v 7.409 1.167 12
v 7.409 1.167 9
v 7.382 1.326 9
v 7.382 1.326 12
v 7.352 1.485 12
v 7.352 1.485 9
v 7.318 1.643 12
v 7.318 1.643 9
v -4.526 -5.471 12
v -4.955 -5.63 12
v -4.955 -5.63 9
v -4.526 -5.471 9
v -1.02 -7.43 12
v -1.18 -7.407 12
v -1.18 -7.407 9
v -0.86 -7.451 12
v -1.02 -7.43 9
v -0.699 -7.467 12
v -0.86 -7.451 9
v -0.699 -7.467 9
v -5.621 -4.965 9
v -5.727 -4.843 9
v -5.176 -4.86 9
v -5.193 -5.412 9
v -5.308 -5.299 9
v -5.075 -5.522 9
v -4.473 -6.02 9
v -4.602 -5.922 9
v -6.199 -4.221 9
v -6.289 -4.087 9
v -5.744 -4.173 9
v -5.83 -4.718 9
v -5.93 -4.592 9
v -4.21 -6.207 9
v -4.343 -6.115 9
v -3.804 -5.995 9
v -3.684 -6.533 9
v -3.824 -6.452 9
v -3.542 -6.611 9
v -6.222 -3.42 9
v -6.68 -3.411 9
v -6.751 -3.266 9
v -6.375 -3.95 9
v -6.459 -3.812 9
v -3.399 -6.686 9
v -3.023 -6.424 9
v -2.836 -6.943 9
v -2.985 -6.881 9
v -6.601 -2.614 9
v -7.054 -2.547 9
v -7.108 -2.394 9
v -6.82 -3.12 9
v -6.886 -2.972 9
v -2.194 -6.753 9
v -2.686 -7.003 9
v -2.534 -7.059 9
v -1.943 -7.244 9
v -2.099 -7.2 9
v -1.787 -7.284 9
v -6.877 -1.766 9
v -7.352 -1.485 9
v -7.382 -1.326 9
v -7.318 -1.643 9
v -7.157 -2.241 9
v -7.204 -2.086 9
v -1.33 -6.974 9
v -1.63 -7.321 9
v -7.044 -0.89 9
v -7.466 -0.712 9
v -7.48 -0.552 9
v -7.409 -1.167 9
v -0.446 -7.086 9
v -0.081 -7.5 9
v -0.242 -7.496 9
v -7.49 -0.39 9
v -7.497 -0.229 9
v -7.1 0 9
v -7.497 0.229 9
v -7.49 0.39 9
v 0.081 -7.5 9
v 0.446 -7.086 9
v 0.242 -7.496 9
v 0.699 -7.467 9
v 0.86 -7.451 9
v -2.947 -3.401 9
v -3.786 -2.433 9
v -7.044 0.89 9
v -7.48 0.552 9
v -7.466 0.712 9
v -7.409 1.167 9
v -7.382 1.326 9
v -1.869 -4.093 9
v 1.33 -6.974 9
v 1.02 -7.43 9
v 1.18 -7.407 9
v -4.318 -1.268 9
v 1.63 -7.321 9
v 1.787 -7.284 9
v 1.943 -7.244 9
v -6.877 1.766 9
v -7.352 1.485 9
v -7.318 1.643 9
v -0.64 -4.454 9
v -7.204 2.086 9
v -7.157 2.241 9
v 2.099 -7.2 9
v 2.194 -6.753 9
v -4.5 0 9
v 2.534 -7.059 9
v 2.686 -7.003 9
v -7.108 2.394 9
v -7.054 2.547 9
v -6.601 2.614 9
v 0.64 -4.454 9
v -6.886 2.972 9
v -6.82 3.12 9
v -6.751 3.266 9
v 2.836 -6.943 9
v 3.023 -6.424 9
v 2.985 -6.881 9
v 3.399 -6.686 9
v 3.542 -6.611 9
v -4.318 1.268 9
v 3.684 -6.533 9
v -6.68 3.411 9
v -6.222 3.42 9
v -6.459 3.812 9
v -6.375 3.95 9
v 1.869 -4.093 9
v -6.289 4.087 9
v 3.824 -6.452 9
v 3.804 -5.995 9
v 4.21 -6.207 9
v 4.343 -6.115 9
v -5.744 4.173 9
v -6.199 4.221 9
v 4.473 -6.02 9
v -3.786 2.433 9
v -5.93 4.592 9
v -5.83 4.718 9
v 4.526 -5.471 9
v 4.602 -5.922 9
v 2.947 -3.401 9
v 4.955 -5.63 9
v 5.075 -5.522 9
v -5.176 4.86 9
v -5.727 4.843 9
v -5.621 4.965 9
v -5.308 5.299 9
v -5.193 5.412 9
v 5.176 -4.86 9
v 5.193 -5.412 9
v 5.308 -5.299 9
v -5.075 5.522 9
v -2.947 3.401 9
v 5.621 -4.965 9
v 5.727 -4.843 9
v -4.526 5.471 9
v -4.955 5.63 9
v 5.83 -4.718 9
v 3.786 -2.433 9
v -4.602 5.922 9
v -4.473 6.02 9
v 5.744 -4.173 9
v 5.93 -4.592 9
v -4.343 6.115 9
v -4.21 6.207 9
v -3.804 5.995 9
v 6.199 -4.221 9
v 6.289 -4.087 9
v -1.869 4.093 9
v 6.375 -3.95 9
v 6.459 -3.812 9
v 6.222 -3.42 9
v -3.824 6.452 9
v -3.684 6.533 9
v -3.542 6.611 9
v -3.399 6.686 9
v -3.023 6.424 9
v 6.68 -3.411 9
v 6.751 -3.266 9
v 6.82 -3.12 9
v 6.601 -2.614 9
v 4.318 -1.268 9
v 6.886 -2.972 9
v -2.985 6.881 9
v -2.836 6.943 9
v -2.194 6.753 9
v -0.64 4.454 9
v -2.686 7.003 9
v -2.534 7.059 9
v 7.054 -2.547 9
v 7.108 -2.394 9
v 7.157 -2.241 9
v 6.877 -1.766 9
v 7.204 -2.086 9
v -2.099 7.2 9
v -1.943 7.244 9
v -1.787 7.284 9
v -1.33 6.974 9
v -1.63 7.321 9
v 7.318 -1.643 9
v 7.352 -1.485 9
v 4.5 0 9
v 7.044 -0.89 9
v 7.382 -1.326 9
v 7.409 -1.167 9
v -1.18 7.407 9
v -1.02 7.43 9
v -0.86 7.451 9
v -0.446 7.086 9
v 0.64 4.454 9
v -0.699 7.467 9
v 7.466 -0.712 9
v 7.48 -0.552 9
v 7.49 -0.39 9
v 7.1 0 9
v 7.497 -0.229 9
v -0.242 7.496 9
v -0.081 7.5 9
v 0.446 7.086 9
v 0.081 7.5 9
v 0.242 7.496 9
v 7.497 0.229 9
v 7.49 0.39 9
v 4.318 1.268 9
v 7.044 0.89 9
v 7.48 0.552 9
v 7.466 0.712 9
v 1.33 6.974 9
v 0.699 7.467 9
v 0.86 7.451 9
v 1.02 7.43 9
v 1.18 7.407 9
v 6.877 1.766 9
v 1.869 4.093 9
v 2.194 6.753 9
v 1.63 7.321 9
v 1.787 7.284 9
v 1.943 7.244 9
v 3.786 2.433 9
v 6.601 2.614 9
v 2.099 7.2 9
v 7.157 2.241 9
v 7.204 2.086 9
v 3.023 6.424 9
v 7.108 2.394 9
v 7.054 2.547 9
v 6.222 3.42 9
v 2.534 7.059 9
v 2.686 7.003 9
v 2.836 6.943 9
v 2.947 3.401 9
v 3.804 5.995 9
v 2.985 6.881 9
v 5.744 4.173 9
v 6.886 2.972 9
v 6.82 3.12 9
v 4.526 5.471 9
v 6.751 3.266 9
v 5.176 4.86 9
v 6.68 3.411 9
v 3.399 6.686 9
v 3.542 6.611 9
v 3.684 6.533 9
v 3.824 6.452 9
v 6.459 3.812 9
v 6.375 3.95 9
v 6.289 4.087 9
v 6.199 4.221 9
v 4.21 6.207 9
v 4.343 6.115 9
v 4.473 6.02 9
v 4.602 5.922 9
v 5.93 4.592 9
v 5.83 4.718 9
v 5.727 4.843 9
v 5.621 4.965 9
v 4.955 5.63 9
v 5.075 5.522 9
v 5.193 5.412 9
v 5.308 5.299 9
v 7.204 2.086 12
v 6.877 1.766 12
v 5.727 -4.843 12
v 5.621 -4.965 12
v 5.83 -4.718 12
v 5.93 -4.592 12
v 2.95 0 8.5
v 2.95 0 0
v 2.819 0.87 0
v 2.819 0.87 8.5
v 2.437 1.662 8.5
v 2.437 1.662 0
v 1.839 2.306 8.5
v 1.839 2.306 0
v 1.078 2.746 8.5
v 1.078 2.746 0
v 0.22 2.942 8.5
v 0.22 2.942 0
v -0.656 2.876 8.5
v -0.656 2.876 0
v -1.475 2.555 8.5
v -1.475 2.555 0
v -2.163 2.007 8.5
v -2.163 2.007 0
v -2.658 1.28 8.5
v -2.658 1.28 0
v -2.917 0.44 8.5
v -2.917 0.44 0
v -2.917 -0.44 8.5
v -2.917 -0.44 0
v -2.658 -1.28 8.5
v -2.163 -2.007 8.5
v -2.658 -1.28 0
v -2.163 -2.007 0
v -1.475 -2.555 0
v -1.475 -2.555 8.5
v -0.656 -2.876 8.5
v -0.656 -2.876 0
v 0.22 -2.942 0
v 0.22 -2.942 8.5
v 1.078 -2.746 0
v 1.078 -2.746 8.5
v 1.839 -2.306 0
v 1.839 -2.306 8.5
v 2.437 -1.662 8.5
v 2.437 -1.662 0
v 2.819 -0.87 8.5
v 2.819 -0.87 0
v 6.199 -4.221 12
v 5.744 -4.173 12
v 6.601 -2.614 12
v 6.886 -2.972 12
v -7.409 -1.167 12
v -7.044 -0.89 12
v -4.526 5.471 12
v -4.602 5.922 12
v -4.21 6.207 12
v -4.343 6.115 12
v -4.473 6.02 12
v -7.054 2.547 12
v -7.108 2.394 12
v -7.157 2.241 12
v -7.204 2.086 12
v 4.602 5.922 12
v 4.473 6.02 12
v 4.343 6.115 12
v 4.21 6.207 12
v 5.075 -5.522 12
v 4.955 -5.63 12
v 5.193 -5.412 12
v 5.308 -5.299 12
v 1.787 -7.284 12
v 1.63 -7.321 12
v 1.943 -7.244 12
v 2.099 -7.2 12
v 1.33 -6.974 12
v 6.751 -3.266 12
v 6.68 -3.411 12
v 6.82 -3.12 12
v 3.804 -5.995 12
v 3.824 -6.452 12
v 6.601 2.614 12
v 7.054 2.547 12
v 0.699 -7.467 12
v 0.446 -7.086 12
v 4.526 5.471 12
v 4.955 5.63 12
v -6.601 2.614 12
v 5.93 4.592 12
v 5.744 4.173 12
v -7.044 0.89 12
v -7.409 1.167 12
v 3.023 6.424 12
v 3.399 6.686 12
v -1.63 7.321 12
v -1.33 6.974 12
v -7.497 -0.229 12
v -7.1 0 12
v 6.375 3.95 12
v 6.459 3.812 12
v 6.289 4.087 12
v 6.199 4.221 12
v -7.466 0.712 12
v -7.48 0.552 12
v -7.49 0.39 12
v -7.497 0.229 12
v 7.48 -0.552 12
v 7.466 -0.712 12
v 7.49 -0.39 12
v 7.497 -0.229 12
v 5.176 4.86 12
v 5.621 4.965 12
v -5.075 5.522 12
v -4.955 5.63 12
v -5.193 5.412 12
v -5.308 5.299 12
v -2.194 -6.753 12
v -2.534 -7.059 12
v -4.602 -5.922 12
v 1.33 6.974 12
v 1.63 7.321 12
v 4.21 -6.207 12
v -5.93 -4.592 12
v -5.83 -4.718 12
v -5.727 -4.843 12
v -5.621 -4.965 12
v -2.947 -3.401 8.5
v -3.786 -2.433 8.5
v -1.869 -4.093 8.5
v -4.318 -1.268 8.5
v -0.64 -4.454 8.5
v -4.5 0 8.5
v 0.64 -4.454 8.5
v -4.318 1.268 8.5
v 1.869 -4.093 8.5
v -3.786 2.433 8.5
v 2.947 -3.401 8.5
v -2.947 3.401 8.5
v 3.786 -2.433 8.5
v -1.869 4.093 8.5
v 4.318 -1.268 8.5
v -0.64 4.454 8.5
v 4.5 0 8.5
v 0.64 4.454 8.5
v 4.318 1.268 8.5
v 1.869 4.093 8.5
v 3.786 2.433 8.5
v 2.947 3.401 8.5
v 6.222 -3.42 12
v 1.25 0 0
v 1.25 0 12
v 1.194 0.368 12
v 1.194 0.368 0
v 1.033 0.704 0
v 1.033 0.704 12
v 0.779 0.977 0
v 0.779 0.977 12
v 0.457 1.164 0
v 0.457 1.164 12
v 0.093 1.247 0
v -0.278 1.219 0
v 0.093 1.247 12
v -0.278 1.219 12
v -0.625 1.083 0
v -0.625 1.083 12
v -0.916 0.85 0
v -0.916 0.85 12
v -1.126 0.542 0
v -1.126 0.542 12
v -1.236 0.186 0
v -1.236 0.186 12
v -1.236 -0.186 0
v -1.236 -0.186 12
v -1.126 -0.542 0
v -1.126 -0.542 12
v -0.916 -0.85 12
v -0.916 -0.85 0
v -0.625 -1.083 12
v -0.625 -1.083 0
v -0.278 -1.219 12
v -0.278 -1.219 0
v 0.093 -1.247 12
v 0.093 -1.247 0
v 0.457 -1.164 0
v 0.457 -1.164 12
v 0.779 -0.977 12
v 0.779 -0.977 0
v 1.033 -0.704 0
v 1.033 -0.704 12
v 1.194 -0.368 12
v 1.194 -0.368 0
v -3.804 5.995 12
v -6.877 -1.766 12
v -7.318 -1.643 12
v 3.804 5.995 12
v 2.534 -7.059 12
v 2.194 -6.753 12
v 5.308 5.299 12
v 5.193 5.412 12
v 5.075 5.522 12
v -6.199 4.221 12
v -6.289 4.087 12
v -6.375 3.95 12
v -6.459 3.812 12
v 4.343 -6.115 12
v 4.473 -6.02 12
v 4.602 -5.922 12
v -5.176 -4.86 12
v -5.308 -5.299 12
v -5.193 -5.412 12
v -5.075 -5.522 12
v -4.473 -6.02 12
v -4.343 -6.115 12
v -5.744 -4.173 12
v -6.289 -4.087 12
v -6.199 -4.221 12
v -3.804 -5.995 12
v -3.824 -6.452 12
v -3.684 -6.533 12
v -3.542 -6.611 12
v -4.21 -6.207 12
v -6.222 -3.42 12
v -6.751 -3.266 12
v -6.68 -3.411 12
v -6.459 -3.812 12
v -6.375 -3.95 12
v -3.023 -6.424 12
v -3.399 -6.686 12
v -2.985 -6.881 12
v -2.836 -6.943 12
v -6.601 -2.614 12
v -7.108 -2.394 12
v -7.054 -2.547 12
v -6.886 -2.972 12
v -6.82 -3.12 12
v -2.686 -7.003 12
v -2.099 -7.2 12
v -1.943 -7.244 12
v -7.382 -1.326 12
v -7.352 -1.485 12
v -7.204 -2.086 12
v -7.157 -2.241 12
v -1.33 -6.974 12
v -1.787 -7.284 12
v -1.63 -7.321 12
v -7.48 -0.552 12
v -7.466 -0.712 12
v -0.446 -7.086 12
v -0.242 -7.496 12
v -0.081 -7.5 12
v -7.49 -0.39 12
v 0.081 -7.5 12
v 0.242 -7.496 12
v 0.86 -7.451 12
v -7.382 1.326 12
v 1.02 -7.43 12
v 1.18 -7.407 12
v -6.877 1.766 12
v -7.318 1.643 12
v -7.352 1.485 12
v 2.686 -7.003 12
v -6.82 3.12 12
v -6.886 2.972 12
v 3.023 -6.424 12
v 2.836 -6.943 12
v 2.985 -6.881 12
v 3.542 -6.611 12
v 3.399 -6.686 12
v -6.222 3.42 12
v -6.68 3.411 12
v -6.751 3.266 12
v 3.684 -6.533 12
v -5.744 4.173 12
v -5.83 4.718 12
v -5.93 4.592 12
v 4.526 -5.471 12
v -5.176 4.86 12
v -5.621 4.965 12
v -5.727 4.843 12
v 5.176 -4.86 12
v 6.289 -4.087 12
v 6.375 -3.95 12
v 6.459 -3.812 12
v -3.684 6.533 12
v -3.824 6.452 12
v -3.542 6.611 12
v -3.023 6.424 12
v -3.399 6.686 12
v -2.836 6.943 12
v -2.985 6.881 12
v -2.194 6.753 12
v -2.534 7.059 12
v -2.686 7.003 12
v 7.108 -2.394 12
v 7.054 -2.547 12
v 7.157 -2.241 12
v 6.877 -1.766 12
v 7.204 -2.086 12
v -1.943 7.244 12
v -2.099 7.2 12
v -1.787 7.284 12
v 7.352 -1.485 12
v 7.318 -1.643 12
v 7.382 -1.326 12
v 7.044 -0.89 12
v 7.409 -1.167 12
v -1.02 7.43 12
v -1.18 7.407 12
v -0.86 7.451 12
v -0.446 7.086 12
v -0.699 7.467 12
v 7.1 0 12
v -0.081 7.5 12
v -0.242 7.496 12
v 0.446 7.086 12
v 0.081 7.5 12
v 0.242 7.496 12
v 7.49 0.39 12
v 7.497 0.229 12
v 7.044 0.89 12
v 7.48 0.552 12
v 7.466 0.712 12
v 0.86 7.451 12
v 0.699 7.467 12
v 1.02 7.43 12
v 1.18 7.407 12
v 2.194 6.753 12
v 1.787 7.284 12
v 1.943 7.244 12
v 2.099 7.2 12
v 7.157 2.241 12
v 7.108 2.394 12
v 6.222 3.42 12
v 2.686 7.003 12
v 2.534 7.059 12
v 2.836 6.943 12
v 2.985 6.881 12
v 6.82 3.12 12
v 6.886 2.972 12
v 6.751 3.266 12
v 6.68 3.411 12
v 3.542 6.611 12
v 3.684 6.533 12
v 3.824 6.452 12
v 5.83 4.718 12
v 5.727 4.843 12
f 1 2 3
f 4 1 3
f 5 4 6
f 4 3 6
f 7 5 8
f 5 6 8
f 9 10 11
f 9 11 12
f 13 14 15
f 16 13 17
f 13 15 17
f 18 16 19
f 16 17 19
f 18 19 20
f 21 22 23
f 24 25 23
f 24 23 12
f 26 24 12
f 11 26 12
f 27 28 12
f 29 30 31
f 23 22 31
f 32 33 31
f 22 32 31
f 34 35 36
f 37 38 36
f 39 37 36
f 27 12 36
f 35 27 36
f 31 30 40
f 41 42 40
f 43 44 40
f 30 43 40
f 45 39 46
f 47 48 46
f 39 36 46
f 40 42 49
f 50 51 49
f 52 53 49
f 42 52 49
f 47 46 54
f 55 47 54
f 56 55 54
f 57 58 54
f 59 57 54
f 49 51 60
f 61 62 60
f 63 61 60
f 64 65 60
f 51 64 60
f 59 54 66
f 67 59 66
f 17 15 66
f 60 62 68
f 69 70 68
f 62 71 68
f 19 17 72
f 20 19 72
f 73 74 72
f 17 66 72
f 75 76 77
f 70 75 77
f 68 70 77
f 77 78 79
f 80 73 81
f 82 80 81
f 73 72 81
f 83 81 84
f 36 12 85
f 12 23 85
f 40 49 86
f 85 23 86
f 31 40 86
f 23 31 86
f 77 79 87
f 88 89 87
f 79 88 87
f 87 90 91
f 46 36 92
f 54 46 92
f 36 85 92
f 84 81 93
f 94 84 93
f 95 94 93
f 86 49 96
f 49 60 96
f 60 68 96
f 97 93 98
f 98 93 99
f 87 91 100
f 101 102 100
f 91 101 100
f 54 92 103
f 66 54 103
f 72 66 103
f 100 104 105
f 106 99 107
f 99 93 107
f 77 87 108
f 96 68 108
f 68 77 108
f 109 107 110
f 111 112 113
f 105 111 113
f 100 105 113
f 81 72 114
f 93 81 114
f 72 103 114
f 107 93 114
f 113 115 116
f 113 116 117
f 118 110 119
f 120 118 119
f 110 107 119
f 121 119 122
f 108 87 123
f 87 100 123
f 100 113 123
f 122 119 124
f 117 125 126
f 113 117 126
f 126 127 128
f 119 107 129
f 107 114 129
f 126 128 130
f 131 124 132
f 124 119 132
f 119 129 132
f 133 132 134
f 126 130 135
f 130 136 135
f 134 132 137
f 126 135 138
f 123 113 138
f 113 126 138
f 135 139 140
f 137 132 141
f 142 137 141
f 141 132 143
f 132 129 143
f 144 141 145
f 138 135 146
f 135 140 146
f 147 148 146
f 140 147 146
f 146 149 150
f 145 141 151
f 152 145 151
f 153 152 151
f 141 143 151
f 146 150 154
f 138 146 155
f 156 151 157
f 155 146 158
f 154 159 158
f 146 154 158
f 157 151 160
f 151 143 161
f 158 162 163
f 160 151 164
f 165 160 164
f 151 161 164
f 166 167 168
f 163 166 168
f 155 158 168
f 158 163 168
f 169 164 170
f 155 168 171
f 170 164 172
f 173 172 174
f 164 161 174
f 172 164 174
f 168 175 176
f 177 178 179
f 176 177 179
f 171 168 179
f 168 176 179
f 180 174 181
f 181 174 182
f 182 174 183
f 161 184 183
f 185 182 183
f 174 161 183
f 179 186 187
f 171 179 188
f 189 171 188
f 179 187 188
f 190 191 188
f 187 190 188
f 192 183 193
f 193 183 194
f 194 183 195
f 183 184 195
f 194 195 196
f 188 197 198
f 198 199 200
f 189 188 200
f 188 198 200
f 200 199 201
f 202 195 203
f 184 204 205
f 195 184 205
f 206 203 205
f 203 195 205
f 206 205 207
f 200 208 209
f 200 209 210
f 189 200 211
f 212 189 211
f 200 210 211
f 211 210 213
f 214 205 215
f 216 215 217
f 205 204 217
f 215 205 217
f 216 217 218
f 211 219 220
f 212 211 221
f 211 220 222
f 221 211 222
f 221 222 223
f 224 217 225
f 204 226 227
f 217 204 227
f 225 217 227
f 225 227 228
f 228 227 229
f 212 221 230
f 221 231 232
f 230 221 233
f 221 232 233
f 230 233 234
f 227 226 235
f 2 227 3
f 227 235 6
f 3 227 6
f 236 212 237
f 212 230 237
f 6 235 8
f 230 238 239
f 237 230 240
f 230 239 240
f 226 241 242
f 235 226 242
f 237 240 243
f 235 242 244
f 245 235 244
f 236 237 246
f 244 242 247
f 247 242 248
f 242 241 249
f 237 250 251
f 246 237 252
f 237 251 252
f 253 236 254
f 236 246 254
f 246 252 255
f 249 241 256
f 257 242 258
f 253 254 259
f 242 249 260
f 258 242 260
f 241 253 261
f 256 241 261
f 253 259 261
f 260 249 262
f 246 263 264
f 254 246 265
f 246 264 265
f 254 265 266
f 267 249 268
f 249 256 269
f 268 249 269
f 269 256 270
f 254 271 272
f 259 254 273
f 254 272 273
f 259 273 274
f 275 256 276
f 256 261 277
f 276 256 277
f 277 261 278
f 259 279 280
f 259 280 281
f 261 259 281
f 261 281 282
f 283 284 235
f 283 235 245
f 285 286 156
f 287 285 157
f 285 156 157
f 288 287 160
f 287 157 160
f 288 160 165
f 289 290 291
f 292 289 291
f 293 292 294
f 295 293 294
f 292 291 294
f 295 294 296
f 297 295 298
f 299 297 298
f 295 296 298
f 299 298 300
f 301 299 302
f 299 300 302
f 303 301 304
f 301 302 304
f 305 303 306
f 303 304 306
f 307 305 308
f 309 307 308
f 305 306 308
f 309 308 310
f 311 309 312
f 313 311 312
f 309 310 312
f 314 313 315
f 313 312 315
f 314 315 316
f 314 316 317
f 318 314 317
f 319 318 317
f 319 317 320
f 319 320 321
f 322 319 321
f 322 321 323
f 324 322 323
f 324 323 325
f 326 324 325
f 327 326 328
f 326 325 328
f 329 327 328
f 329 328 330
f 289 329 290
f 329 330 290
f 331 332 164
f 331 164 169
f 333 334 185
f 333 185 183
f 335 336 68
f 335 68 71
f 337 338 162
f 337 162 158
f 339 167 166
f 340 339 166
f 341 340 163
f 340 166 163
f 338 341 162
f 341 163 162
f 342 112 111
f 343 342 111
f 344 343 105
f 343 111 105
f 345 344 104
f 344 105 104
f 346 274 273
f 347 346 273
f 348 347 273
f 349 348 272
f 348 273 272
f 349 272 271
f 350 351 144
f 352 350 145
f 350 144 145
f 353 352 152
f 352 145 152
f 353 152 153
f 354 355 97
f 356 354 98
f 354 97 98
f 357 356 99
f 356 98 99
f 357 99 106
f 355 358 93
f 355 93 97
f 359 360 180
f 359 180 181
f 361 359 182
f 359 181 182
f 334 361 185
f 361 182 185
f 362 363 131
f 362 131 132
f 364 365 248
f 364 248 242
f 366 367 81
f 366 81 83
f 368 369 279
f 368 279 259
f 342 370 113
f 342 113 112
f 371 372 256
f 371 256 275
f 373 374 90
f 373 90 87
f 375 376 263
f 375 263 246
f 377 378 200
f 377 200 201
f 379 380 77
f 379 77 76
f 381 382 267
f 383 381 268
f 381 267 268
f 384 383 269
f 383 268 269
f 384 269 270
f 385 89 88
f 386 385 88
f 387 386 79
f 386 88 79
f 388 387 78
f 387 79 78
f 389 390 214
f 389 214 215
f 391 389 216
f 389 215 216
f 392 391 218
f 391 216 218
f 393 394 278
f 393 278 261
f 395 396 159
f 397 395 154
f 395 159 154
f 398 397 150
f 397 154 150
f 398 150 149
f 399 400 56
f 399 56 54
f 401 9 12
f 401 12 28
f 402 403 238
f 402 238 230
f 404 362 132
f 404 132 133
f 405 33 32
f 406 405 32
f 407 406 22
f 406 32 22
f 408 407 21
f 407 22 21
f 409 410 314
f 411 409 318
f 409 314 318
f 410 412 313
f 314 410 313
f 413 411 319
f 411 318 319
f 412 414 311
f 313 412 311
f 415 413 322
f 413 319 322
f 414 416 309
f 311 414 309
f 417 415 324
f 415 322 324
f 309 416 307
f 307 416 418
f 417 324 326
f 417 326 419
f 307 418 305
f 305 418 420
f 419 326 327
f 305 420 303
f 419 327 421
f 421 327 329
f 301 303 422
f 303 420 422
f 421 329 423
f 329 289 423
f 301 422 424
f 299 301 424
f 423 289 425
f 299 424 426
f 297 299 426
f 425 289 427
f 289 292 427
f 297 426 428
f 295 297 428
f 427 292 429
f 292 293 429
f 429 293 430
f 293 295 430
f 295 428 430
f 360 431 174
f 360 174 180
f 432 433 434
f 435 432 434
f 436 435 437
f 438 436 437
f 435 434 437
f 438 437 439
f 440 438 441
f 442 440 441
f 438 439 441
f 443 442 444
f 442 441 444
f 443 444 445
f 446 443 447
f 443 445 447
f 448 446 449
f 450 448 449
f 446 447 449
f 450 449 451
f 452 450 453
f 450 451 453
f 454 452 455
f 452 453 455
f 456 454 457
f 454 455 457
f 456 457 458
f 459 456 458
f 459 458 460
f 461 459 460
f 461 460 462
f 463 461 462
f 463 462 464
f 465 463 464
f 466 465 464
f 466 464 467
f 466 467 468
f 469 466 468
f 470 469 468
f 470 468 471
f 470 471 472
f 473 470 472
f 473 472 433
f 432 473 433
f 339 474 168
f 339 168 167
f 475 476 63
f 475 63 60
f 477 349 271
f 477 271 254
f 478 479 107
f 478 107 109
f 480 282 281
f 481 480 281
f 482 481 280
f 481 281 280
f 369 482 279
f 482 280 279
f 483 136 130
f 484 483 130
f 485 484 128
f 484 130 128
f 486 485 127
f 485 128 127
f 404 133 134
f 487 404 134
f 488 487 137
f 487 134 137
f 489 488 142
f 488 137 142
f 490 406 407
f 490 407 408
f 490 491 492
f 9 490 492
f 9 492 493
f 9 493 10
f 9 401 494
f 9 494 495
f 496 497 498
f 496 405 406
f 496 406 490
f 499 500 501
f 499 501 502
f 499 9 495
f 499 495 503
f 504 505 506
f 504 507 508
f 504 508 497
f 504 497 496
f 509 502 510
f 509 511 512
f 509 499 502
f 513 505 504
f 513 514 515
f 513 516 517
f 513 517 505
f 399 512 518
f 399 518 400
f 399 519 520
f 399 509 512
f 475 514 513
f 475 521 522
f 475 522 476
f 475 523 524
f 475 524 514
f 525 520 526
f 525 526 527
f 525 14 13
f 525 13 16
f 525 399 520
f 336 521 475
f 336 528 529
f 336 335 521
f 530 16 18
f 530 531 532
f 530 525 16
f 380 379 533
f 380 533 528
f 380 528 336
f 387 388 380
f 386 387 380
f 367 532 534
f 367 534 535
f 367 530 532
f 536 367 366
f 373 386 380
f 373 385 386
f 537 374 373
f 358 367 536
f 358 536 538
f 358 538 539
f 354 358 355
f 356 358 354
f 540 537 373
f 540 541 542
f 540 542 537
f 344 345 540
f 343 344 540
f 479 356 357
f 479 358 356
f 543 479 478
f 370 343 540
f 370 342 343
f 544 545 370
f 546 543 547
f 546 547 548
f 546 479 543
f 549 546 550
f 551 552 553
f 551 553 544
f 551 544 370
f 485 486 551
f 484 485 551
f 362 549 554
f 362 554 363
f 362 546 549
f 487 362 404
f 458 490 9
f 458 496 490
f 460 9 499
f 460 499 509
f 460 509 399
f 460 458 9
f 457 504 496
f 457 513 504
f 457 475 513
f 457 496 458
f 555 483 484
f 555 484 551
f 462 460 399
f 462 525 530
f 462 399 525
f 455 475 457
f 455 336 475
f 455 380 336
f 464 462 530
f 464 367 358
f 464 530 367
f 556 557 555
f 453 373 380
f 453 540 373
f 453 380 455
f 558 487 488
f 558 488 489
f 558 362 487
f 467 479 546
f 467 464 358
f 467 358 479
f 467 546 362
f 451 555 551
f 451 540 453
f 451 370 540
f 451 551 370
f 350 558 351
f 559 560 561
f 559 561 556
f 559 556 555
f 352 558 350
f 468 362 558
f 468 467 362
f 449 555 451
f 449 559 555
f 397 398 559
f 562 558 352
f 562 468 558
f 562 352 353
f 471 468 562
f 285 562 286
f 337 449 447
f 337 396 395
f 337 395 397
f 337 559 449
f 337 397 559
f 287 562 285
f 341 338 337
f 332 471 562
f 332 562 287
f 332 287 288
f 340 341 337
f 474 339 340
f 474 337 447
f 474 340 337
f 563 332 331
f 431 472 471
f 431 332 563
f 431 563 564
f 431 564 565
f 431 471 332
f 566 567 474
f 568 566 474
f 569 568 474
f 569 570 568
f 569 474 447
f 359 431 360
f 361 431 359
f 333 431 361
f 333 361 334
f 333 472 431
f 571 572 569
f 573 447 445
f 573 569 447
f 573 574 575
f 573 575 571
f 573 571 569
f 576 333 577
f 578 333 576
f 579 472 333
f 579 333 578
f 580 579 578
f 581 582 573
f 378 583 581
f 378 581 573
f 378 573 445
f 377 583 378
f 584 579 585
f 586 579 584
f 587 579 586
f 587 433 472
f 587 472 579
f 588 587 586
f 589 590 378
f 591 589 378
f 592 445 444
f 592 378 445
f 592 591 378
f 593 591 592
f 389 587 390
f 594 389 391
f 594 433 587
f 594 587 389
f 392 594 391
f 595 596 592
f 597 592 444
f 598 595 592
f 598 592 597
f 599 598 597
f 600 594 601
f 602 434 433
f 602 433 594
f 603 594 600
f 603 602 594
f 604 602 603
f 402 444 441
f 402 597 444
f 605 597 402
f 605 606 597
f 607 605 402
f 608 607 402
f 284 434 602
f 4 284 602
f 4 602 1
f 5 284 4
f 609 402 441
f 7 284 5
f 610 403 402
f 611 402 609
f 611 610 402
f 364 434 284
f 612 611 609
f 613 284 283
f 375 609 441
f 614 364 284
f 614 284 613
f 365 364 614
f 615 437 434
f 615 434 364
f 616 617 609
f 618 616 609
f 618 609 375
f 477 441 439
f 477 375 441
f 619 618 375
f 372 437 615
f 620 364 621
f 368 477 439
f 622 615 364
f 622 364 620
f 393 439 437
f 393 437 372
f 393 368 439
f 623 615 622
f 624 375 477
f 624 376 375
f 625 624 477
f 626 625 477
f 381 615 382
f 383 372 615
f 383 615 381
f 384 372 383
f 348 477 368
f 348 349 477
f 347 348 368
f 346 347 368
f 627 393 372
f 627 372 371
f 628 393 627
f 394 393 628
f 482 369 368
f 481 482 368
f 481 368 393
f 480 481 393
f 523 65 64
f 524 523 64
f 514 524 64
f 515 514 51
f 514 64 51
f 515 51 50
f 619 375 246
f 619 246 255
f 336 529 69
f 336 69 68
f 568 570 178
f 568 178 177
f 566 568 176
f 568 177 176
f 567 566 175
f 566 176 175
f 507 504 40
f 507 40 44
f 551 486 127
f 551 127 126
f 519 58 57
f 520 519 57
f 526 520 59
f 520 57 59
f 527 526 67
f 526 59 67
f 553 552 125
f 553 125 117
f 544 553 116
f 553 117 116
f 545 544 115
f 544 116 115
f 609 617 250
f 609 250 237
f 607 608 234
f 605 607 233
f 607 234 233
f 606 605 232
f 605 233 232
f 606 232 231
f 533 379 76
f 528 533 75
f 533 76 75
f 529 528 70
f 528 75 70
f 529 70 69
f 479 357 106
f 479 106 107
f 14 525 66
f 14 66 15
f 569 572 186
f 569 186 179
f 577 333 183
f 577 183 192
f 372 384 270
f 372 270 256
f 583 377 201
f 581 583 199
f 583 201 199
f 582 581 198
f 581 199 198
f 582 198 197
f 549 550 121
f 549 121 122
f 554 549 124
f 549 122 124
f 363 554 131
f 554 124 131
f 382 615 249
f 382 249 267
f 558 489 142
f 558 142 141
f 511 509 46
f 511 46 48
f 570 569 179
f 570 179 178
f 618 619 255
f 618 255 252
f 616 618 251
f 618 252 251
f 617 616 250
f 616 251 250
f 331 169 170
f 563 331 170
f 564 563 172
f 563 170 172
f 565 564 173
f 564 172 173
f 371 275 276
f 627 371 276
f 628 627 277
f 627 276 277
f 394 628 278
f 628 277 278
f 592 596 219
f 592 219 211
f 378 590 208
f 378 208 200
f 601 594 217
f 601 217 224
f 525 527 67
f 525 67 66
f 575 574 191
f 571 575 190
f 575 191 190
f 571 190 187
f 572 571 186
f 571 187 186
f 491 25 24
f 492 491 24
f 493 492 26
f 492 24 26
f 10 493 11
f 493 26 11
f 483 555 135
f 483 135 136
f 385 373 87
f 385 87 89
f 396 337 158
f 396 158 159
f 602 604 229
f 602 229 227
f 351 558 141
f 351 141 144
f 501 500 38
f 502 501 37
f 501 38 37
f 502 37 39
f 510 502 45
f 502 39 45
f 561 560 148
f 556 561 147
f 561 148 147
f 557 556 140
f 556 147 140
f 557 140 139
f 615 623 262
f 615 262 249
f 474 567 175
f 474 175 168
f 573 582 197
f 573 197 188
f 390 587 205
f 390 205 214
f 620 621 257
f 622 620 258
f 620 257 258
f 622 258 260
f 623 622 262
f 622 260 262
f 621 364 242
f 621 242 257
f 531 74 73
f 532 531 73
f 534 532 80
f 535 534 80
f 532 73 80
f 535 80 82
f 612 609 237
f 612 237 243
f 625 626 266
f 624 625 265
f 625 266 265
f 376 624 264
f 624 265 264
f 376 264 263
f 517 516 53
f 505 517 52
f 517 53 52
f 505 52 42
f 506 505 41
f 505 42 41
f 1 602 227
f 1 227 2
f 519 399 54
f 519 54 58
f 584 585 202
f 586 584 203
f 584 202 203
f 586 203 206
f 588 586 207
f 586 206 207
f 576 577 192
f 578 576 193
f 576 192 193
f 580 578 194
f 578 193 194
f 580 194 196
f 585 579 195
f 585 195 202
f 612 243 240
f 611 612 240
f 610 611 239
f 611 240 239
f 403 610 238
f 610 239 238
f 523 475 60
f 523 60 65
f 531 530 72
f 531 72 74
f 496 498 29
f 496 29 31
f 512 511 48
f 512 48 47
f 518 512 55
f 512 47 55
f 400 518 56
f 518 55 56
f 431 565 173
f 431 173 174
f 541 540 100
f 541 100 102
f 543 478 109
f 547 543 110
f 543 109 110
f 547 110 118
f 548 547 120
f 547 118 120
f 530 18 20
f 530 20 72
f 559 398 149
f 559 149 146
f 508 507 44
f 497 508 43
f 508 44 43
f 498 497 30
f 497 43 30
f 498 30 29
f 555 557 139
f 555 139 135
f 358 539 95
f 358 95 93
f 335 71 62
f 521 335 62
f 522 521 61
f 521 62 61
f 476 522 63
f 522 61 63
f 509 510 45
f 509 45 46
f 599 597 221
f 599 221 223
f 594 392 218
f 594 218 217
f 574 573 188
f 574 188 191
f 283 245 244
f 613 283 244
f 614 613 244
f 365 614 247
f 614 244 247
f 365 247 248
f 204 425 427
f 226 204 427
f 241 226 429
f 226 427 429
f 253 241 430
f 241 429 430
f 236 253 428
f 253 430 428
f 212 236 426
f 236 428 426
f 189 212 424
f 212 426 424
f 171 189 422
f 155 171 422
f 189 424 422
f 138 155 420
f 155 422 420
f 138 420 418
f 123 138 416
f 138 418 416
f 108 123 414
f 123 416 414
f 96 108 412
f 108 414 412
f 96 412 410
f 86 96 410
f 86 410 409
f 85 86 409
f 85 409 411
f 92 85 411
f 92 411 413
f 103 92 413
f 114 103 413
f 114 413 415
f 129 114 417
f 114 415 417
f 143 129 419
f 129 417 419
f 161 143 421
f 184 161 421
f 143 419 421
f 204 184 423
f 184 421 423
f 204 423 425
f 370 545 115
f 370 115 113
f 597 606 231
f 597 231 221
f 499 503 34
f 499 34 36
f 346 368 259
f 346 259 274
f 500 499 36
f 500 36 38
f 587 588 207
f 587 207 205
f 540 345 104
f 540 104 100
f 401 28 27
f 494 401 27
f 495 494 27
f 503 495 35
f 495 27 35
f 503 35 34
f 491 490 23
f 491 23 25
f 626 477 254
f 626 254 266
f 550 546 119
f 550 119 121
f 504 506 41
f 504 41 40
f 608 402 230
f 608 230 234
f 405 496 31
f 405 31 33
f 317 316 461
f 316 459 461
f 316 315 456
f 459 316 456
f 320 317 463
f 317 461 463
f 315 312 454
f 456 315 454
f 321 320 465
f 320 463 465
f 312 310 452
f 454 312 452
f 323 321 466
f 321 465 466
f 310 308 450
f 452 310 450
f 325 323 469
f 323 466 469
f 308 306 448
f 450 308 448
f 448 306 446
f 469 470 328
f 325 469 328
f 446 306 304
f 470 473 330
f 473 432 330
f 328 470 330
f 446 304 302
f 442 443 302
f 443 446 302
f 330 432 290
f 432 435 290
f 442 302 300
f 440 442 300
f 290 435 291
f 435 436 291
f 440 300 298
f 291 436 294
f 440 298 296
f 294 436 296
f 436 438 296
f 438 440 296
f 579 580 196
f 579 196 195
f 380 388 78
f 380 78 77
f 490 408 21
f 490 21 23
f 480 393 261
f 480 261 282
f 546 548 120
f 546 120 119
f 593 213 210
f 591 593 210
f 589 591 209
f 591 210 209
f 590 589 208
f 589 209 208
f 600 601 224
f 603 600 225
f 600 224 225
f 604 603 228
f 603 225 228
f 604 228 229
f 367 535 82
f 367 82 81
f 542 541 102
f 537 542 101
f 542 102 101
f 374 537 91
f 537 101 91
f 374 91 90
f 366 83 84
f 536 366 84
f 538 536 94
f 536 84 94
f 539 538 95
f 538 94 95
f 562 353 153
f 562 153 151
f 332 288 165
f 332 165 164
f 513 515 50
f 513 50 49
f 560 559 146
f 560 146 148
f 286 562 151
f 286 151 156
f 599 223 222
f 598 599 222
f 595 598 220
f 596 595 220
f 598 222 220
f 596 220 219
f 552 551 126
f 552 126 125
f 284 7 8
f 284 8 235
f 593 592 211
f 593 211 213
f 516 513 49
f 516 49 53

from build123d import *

# Parameters (mm, degrees)
SKETCH_R           = 2.95
PAD_DEPTH          = 8.5
SKETCH001_R        = 4.5
PAD001_DEPTH       = 0.5
SKETCH002_R        = 7.5
PAD002_DEPTH       = 3
SKETCH003_R        = 1.25
HOLE_DEPTH         = 12.001
POCKET_DEPTH       = 60.74523
POLARPATTERN_COUNT = 50


with BuildPart() as part:
    # Sketch → Pad (new body)
    with BuildSketch(Plane.XY):
        Circle(SKETCH_R)
    extrude(amount=PAD_DEPTH)

    # Sketch001 (on Face4 of Pad) → Pad001 (join)
    with BuildSketch(Plane.XY.offset(8.5)):
        Circle(SKETCH001_R)
    extrude(amount=PAD001_DEPTH)

    # Sketch002 (on Face7 of Pad001) → Pad002 (join)
    with BuildSketch(Plane.XY.offset(9)):
        Circle(SKETCH002_R)
    extrude(amount=PAD002_DEPTH)

    # Sketch003 (on Face7 of Pad002) → Hole (cut, through all)
    with BuildSketch(Plane.XY.offset(12)):
        Circle(SKETCH003_R)
    extrude(amount=-HOLE_DEPTH, mode=Mode.SUBTRACT)

    # Sketch004 (on Face5 of Hole) → Pocket (cut, through all)
    with BuildSketch(Plane.XY.offset(12)):
        Polygon((7.1, 0), (7.533013, 0.25), (7.533013, -0.25), align=None)
    pocket = extrude(amount=-POCKET_DEPTH, mode=Mode.SUBTRACT)

    # PolarPattern: Pocket ×50 about axis
    polarpattern_axis = Axis((0, 0, 12), (0, 0, 1))
    for i in range(1, POLARPATTERN_COUNT):
        add(pocket.rotate(polarpattern_axis, i * 360 / POLARPATTERN_COUNT), mode=Mode.SUBTRACT)


solid = part.part
